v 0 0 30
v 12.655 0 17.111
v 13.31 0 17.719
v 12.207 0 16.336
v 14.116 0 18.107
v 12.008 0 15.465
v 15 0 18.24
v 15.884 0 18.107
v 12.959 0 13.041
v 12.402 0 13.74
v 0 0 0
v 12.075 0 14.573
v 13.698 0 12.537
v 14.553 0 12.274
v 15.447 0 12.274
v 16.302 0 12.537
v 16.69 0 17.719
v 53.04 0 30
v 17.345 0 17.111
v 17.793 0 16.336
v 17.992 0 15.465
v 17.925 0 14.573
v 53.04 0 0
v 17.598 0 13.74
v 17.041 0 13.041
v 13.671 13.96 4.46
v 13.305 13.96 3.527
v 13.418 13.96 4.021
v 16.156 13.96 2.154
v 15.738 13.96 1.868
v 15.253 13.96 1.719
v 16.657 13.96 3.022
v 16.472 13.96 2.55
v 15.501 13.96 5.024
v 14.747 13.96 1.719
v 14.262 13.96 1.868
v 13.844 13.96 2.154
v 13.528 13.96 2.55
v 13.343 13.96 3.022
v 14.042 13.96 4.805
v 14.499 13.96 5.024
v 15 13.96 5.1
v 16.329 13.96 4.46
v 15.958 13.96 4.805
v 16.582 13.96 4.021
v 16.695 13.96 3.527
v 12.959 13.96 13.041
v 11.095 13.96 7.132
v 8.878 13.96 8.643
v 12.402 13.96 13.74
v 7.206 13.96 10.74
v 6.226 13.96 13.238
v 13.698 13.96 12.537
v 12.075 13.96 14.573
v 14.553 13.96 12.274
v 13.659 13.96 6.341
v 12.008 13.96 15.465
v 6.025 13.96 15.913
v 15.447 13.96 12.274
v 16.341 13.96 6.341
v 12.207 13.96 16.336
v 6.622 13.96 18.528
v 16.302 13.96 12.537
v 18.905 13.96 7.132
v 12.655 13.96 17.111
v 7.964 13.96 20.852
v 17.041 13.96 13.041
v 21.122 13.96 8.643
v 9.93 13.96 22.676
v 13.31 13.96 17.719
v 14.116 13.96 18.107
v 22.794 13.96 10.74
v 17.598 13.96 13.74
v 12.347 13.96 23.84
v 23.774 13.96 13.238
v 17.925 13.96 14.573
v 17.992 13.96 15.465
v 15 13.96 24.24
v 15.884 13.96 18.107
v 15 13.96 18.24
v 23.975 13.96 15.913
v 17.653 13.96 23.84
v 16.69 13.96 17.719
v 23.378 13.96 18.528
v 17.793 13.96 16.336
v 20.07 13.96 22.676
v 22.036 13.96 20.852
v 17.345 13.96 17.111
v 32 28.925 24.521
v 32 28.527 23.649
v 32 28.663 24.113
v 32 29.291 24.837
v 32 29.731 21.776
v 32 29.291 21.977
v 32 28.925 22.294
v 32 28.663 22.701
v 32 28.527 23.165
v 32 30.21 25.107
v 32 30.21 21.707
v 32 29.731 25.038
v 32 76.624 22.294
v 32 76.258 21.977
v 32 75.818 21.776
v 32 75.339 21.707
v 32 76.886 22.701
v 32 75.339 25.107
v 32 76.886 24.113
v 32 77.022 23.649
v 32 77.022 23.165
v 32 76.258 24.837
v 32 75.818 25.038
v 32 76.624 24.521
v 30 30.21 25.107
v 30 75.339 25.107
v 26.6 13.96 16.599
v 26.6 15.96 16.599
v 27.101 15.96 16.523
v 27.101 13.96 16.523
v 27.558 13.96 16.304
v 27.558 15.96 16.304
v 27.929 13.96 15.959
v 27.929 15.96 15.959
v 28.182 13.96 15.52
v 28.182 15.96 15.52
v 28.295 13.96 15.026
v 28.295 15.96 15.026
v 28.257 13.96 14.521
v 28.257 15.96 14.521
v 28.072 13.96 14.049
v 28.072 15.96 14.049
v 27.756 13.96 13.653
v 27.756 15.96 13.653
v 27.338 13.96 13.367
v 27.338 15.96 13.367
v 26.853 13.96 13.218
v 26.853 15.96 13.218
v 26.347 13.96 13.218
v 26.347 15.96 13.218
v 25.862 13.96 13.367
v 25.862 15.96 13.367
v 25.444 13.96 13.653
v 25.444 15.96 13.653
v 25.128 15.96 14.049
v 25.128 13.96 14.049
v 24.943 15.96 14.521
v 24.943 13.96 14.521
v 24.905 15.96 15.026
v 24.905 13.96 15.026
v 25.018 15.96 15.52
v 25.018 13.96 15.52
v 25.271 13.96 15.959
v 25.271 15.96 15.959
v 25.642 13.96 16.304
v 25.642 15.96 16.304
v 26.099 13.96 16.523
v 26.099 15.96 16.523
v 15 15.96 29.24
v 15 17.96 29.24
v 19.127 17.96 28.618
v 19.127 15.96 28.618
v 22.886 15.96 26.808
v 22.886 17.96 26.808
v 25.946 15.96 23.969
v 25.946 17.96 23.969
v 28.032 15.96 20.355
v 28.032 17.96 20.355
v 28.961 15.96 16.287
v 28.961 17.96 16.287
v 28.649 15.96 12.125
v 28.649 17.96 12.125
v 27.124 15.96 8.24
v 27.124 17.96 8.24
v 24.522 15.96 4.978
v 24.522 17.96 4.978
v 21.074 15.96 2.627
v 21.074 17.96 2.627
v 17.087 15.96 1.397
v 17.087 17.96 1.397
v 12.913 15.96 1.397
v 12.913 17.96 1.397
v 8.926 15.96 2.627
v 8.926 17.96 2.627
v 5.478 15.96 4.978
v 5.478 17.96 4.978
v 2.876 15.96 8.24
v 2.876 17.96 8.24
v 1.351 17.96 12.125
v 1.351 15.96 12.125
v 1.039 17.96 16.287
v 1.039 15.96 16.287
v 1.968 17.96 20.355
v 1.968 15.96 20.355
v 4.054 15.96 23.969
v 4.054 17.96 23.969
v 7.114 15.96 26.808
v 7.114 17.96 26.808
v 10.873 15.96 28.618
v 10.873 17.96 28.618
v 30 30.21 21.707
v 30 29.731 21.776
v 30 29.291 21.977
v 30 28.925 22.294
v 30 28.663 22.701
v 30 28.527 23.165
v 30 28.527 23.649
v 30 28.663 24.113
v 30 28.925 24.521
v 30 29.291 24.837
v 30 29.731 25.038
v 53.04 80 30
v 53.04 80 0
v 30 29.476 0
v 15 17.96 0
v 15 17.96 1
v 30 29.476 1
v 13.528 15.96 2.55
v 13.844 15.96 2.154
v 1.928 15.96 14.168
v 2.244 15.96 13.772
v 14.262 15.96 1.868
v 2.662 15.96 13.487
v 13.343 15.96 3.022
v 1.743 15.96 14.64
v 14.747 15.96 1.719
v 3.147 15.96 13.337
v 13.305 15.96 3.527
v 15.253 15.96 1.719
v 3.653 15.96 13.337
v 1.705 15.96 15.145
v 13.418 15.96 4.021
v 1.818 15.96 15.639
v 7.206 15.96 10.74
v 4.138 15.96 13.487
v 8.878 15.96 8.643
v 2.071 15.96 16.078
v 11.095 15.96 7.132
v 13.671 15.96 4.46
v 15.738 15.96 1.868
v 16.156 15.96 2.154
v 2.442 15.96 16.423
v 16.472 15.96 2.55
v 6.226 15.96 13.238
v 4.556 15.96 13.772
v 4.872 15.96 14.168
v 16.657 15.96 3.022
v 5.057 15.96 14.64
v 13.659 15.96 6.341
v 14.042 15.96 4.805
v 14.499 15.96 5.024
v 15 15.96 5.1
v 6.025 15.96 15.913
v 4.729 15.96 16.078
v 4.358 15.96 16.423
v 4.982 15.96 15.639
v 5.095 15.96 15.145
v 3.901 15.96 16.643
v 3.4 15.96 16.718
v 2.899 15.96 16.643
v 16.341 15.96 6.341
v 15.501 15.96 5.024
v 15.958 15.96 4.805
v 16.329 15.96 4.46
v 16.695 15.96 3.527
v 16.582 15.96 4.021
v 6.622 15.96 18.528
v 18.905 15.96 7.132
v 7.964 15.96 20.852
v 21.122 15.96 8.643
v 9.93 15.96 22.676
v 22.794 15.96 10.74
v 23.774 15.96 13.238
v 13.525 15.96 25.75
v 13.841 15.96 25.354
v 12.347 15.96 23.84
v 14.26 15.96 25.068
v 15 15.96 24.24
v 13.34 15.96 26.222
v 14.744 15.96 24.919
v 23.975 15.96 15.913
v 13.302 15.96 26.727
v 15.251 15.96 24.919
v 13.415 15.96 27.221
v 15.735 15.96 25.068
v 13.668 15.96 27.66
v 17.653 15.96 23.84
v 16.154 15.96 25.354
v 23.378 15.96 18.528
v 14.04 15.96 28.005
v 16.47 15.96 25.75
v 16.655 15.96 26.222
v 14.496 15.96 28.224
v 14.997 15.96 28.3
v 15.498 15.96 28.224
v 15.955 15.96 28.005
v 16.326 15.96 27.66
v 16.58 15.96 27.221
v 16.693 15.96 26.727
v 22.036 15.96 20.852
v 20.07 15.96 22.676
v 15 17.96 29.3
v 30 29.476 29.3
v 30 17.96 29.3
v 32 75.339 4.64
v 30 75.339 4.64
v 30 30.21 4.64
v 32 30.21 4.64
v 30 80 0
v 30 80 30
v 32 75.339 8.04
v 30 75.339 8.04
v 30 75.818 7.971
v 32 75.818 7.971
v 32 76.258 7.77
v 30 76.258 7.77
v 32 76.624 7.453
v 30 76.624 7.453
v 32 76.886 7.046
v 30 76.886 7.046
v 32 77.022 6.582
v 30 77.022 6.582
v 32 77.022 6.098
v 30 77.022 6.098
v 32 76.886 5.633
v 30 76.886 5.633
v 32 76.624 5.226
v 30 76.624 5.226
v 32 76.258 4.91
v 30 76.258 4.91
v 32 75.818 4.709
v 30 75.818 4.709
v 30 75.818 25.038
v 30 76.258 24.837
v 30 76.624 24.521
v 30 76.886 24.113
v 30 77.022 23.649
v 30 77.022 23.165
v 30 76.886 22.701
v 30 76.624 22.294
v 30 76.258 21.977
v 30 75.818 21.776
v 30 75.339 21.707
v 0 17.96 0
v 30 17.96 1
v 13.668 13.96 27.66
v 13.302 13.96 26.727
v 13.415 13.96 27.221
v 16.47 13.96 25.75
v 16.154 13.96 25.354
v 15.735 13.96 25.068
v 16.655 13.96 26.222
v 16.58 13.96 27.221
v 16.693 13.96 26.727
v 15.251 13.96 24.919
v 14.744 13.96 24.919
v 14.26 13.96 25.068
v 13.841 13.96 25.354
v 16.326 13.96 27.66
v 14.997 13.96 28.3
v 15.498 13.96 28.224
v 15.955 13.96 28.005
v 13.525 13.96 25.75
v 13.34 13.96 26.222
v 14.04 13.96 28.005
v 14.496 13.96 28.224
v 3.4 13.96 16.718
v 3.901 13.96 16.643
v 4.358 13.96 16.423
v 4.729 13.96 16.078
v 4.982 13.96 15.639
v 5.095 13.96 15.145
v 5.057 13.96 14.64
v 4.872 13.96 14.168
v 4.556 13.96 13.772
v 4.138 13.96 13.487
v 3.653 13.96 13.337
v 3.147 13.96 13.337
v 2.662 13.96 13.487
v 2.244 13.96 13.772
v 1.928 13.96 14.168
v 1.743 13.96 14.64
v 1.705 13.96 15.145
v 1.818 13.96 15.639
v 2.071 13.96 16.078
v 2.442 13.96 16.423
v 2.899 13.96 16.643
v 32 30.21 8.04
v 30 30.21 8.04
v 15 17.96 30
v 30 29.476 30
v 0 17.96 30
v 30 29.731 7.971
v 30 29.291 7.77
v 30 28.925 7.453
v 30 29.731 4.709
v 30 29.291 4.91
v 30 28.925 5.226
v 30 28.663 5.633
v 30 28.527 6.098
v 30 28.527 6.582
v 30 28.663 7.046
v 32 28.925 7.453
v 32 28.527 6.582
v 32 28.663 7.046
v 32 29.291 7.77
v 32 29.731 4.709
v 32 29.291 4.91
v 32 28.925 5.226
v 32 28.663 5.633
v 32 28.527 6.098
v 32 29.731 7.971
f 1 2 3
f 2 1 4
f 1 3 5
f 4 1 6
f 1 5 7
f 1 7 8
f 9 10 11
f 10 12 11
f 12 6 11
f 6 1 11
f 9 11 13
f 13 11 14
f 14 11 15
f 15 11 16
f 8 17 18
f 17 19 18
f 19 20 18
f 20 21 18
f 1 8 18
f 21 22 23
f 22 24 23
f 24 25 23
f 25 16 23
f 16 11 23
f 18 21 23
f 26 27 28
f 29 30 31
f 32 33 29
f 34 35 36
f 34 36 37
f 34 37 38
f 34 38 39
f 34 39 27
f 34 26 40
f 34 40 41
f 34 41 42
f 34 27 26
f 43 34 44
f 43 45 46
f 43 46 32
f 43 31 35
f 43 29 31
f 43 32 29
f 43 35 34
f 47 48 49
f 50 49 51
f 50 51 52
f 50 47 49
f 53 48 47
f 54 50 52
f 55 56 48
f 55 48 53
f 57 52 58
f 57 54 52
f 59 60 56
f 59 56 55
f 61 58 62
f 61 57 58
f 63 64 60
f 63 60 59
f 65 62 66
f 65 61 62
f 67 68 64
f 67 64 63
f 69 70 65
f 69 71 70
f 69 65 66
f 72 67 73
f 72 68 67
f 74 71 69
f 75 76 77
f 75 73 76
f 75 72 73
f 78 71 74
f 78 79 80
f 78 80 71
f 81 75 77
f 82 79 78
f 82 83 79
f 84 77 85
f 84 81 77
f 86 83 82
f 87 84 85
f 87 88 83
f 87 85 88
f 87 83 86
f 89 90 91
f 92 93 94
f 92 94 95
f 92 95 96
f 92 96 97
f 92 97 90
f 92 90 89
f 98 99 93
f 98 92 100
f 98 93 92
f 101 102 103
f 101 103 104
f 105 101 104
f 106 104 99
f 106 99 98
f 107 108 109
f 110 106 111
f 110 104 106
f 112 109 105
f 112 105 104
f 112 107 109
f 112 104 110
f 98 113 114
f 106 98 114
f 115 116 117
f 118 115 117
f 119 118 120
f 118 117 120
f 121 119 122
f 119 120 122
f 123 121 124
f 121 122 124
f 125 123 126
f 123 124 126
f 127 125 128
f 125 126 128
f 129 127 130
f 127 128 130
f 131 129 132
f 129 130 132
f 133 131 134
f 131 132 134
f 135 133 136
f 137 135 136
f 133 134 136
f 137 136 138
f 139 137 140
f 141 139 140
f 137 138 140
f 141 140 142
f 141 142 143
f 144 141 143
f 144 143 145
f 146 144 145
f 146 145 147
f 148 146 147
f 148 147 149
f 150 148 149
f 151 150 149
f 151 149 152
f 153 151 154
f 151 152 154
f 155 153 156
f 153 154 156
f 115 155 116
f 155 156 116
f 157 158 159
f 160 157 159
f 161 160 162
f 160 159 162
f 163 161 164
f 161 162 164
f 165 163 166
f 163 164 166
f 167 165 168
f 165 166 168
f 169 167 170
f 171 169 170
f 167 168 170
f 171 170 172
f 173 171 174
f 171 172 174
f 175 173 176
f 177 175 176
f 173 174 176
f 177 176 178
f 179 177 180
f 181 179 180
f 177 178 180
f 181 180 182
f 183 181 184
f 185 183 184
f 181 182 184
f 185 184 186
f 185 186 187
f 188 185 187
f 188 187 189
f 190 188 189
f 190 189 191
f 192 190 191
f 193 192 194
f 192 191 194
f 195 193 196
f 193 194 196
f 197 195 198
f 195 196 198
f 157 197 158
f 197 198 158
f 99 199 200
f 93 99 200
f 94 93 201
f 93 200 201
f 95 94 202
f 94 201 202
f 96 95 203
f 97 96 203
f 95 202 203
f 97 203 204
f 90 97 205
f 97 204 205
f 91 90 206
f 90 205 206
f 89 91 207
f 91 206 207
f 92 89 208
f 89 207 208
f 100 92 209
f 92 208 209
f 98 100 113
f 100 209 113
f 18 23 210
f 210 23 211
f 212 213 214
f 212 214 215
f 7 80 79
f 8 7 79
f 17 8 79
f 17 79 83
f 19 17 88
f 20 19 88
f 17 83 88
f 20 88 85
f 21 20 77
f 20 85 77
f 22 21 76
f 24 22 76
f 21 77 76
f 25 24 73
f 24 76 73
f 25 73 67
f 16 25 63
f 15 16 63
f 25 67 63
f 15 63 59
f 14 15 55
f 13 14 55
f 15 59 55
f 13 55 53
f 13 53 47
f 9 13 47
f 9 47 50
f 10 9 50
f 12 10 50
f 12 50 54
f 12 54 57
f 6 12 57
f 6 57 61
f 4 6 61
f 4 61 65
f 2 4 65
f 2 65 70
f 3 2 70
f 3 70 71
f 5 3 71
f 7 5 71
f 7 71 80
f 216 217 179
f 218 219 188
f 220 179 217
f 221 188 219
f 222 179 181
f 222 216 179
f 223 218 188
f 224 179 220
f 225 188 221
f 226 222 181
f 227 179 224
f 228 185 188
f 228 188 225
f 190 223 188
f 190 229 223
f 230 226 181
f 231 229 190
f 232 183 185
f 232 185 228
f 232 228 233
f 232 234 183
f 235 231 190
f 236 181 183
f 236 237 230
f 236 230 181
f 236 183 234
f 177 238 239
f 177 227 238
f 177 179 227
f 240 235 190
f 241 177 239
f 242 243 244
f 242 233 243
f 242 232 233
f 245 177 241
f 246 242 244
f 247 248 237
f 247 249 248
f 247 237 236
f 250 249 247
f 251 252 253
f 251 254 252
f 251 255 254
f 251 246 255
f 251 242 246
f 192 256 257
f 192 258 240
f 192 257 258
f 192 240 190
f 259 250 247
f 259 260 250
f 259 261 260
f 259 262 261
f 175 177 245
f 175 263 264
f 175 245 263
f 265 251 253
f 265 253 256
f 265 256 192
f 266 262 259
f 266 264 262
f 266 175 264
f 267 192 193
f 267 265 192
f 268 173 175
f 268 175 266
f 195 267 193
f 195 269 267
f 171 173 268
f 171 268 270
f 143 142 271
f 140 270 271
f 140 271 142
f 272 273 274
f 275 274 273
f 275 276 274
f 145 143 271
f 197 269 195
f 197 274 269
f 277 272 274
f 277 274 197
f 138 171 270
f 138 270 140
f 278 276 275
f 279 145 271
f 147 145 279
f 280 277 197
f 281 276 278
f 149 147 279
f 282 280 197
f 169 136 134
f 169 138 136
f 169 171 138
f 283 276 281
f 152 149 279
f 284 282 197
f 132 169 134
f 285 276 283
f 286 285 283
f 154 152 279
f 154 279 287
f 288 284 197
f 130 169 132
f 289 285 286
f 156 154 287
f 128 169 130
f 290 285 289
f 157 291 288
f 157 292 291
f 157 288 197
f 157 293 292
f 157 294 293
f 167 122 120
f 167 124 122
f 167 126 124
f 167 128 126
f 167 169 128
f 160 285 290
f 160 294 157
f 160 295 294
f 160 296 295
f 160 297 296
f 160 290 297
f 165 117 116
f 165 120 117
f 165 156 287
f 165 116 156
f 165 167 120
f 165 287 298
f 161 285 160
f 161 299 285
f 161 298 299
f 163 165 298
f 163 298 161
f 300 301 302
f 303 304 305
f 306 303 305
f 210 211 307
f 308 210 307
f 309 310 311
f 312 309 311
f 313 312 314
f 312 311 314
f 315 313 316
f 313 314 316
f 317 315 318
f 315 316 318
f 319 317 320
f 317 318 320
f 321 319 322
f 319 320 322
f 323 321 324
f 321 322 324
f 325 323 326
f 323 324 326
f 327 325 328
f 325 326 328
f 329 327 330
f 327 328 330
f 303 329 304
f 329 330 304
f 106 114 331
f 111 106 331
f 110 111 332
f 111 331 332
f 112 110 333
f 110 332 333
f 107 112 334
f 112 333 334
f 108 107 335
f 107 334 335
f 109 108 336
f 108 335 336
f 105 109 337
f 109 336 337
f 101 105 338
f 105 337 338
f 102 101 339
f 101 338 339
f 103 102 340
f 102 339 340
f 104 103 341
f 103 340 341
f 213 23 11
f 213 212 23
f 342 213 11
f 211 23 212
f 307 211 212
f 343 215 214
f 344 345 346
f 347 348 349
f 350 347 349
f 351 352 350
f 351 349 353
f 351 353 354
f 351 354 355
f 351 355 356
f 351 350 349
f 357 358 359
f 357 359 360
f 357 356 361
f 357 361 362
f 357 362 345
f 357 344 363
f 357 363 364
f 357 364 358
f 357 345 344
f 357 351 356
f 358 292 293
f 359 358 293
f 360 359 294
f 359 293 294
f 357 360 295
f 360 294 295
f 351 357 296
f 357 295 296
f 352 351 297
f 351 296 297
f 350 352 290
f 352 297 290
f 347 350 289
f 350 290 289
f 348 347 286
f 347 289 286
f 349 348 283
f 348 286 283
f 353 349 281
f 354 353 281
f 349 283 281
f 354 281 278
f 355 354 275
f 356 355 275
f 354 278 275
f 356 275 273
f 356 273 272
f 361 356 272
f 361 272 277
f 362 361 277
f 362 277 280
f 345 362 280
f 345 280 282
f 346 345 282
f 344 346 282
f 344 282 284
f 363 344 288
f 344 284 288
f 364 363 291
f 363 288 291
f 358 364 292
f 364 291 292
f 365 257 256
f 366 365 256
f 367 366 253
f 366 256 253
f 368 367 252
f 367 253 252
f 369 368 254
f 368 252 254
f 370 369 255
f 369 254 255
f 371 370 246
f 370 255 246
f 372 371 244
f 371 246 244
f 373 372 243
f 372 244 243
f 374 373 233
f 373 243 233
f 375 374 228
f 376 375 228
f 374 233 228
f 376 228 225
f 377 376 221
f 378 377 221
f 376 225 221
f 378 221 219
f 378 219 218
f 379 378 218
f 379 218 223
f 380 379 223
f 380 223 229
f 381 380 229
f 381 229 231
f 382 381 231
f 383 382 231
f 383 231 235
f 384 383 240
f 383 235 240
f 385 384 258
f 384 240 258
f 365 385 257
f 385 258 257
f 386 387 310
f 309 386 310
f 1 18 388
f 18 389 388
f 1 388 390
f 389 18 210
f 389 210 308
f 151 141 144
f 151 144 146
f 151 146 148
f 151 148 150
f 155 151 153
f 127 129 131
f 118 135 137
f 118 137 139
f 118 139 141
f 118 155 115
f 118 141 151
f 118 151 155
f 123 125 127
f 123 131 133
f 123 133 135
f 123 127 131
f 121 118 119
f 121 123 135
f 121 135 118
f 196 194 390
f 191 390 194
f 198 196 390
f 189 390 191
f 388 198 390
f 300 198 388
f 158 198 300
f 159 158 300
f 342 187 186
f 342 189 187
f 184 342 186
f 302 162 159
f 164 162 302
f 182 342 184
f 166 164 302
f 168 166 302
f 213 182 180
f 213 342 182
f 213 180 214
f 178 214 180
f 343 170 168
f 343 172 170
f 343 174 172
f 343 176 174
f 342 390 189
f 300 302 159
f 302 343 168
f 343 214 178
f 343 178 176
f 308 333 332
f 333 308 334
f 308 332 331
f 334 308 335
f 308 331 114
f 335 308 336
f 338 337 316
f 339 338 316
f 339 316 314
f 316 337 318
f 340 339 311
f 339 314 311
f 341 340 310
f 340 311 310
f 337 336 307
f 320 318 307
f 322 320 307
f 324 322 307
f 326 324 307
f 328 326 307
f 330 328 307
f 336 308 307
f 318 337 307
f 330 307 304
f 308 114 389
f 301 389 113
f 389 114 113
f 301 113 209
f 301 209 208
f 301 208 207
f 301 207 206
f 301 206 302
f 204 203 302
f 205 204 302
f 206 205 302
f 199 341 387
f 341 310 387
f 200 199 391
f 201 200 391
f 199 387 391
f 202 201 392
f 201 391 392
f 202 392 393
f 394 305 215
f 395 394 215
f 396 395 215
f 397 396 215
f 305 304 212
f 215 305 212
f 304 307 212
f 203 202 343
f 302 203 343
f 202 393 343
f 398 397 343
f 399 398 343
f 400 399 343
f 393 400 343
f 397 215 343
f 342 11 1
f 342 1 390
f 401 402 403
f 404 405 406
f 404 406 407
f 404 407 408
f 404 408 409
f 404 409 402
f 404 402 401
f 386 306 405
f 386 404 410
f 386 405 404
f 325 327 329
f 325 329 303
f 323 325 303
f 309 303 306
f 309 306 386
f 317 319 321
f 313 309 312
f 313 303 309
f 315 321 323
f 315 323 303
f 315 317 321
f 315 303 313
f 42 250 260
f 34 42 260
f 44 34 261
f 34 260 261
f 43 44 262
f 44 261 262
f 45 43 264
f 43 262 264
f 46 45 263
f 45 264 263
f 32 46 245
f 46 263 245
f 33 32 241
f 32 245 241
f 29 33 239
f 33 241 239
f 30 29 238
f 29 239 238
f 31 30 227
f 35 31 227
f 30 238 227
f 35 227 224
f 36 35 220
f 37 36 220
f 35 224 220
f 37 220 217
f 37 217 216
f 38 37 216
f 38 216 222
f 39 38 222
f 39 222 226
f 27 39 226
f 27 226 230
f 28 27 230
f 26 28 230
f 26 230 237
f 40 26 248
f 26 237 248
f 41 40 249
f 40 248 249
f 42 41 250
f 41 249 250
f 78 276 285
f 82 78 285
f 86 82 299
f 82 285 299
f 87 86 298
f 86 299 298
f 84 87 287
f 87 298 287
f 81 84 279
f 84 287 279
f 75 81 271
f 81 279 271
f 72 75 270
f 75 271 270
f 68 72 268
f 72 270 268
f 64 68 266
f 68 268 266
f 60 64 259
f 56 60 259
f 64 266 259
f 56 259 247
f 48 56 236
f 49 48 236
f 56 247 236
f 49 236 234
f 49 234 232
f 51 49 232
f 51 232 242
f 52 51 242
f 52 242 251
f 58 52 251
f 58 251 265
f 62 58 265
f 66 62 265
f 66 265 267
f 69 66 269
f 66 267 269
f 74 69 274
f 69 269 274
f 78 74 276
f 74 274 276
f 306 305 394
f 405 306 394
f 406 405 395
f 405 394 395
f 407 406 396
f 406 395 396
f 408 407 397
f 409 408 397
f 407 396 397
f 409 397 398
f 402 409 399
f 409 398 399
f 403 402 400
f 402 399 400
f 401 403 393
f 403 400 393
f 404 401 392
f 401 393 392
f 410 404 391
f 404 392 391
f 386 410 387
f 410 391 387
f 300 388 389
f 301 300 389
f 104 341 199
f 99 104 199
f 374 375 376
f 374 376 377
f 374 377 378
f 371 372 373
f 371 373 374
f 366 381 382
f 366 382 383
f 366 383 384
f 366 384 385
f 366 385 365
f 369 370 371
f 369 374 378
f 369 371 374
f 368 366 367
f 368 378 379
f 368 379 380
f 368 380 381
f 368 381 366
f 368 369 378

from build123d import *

# Parameters (mm, degrees)
SKETCH1_W           = 30
SKETCH1_H           = 17.96
BOSS_EXTRUDE1_DEPTH = 30
SKETCH2_R           = 14
CUT_EXTRUDE1_DEPTH  = 2
SKETCH3_R           = 1.7
CUT_EXTRUDE2_DEPTH  = 2
SKETCH4_R           = 9
CUT_EXTRUDE3_DEPTH  = 2
SKETCH5_R           = 3
CUT_EXTRUDE6_DEPTH  = 90.858350753
CUT_EXTRUDE7_DEPTH  = 2
BOSS_EXTRUDE2_DEPTH = 1
EXTRUDE_THIN1_DEPTH = 0.7


with BuildPart() as part:
    # Sketch1 → Boss-Extrude1 (new body)
    with BuildSketch(Plane.XY):
        with Locations((15, 8.98)):
            Rectangle(SKETCH1_W, SKETCH1_H)
        Polygon((30, 17.96), (30, 0), (53.04, 0), (53.04, 80), (30, 80), align=None)
    extrude(amount=BOSS_EXTRUDE1_DEPTH)

    # Sketch2 → Cut-Extrude1 (cut)
    with BuildSketch(Plane(origin=(0, 17.96, 0), x_dir=(1, 0, 0), z_dir=(0, 1, 0))):
        with Locations(Location((15, -15.240313603, 0), (0, 0, 270))):
            Circle(SKETCH2_R)
    extrude(amount=-CUT_EXTRUDE1_DEPTH, mode=Mode.SUBTRACT)

    # Sketch3 → Cut-Extrude2 (cut)
    with BuildSketch(Plane(origin=(0, 15.96, 0), x_dir=(1, 0, 0), z_dir=(0, 1, 0))):
        with Locations(Location((15, -3.4, 0), (0, 0, 270))):
            Circle(SKETCH3_R)
        with Locations(Location((26.6, -14.898975901, 0), (0, 0, 270))):
            Circle(SKETCH3_R)
        with Locations(Location((14.997277846, -26.6, 0), (0, 0, 270))):
            Circle(SKETCH3_R)
        with Locations(Location((3.4, -15.0181958, 0), (0, 0, 270))):
            Circle(SKETCH3_R)
    extrude(amount=-CUT_EXTRUDE2_DEPTH, mode=Mode.SUBTRACT)

    # Sketch4 → Cut-Extrude3 (cut)
    with BuildSketch(Plane(origin=(0, 15.96, 0), x_dir=(1, 0, 0), z_dir=(0, 1, 0))):
        with Locations(Location((15, -15.240313603, 0), (0, 0, 270))):
            Circle(SKETCH4_R)
    extrude(amount=-CUT_EXTRUDE3_DEPTH, mode=Mode.SUBTRACT)

    # Sketch5 → Cut-Extrude6 (cut, through all)
    with BuildSketch(Plane(origin=(0, 13.96, 0), x_dir=(1, 0, 0), z_dir=(0, 1, 0))):
        with Locations(Location((15, -15.240313603, 0), (0, 0, 270))):
            Circle(SKETCH5_R)
    extrude(amount=-CUT_EXTRUDE6_DEPTH, mode=Mode.SUBTRACT)

    # Sketch6 → Cut-Extrude7 (cut)
    with BuildSketch(Plane.ZY.offset(-30)):
        with BuildLine():
            Line((4.639681938, 75.339266158), (4.639681938, 30.209714413))
            ThreePointArc((4.639681938, 30.209714413), (6.339681938, 28.509714413), (8.039681938, 30.209714413))
            Line((8.039681938, 30.209714413), (8.039681938, 75.339266158))
            ThreePointArc((8.039681938, 75.339266158), (6.339681938, 77.039266158), (4.639681938, 75.339266158))
        make_face()
        with BuildLine():
            Line((21.70723863, 75.339266158), (21.70723863, 30.209714413))
            ThreePointArc((21.70723863, 30.209714413), (23.40723863, 28.509714413), (25.10723863, 30.209714413))
            Line((25.10723863, 30.209714413), (25.10723863, 75.339266158))
            ThreePointArc((25.10723863, 75.339266158), (23.40723863, 77.039266158), (21.70723863, 75.339266158))
        make_face()
    extrude(amount=-CUT_EXTRUDE7_DEPTH, mode=Mode.SUBTRACT)

    # Sketch7 → Boss-Extrude2 (add)
    with BuildSketch(Plane(origin=(0, 0, 0), x_dir=(-1, 0, 0), z_dir=(0, 0, -1))):
        Polygon((-15, 17.96), (-30, 29.475844043), (-30, 17.96), align=None)
    extrude(amount=-BOSS_EXTRUDE2_DEPTH)

    # Sketch8 → Extrude-Thin1 (add)
    with BuildSketch(Plane.XY.offset(30)):
        Polygon((15, 17.96), (30, 29.475844043), (36.089590867, 21.543827713), (21.089590867, 10.027983669), align=None)
    extrude(amount=-EXTRUDE_THIN1_DEPTH)


solid = part.part
